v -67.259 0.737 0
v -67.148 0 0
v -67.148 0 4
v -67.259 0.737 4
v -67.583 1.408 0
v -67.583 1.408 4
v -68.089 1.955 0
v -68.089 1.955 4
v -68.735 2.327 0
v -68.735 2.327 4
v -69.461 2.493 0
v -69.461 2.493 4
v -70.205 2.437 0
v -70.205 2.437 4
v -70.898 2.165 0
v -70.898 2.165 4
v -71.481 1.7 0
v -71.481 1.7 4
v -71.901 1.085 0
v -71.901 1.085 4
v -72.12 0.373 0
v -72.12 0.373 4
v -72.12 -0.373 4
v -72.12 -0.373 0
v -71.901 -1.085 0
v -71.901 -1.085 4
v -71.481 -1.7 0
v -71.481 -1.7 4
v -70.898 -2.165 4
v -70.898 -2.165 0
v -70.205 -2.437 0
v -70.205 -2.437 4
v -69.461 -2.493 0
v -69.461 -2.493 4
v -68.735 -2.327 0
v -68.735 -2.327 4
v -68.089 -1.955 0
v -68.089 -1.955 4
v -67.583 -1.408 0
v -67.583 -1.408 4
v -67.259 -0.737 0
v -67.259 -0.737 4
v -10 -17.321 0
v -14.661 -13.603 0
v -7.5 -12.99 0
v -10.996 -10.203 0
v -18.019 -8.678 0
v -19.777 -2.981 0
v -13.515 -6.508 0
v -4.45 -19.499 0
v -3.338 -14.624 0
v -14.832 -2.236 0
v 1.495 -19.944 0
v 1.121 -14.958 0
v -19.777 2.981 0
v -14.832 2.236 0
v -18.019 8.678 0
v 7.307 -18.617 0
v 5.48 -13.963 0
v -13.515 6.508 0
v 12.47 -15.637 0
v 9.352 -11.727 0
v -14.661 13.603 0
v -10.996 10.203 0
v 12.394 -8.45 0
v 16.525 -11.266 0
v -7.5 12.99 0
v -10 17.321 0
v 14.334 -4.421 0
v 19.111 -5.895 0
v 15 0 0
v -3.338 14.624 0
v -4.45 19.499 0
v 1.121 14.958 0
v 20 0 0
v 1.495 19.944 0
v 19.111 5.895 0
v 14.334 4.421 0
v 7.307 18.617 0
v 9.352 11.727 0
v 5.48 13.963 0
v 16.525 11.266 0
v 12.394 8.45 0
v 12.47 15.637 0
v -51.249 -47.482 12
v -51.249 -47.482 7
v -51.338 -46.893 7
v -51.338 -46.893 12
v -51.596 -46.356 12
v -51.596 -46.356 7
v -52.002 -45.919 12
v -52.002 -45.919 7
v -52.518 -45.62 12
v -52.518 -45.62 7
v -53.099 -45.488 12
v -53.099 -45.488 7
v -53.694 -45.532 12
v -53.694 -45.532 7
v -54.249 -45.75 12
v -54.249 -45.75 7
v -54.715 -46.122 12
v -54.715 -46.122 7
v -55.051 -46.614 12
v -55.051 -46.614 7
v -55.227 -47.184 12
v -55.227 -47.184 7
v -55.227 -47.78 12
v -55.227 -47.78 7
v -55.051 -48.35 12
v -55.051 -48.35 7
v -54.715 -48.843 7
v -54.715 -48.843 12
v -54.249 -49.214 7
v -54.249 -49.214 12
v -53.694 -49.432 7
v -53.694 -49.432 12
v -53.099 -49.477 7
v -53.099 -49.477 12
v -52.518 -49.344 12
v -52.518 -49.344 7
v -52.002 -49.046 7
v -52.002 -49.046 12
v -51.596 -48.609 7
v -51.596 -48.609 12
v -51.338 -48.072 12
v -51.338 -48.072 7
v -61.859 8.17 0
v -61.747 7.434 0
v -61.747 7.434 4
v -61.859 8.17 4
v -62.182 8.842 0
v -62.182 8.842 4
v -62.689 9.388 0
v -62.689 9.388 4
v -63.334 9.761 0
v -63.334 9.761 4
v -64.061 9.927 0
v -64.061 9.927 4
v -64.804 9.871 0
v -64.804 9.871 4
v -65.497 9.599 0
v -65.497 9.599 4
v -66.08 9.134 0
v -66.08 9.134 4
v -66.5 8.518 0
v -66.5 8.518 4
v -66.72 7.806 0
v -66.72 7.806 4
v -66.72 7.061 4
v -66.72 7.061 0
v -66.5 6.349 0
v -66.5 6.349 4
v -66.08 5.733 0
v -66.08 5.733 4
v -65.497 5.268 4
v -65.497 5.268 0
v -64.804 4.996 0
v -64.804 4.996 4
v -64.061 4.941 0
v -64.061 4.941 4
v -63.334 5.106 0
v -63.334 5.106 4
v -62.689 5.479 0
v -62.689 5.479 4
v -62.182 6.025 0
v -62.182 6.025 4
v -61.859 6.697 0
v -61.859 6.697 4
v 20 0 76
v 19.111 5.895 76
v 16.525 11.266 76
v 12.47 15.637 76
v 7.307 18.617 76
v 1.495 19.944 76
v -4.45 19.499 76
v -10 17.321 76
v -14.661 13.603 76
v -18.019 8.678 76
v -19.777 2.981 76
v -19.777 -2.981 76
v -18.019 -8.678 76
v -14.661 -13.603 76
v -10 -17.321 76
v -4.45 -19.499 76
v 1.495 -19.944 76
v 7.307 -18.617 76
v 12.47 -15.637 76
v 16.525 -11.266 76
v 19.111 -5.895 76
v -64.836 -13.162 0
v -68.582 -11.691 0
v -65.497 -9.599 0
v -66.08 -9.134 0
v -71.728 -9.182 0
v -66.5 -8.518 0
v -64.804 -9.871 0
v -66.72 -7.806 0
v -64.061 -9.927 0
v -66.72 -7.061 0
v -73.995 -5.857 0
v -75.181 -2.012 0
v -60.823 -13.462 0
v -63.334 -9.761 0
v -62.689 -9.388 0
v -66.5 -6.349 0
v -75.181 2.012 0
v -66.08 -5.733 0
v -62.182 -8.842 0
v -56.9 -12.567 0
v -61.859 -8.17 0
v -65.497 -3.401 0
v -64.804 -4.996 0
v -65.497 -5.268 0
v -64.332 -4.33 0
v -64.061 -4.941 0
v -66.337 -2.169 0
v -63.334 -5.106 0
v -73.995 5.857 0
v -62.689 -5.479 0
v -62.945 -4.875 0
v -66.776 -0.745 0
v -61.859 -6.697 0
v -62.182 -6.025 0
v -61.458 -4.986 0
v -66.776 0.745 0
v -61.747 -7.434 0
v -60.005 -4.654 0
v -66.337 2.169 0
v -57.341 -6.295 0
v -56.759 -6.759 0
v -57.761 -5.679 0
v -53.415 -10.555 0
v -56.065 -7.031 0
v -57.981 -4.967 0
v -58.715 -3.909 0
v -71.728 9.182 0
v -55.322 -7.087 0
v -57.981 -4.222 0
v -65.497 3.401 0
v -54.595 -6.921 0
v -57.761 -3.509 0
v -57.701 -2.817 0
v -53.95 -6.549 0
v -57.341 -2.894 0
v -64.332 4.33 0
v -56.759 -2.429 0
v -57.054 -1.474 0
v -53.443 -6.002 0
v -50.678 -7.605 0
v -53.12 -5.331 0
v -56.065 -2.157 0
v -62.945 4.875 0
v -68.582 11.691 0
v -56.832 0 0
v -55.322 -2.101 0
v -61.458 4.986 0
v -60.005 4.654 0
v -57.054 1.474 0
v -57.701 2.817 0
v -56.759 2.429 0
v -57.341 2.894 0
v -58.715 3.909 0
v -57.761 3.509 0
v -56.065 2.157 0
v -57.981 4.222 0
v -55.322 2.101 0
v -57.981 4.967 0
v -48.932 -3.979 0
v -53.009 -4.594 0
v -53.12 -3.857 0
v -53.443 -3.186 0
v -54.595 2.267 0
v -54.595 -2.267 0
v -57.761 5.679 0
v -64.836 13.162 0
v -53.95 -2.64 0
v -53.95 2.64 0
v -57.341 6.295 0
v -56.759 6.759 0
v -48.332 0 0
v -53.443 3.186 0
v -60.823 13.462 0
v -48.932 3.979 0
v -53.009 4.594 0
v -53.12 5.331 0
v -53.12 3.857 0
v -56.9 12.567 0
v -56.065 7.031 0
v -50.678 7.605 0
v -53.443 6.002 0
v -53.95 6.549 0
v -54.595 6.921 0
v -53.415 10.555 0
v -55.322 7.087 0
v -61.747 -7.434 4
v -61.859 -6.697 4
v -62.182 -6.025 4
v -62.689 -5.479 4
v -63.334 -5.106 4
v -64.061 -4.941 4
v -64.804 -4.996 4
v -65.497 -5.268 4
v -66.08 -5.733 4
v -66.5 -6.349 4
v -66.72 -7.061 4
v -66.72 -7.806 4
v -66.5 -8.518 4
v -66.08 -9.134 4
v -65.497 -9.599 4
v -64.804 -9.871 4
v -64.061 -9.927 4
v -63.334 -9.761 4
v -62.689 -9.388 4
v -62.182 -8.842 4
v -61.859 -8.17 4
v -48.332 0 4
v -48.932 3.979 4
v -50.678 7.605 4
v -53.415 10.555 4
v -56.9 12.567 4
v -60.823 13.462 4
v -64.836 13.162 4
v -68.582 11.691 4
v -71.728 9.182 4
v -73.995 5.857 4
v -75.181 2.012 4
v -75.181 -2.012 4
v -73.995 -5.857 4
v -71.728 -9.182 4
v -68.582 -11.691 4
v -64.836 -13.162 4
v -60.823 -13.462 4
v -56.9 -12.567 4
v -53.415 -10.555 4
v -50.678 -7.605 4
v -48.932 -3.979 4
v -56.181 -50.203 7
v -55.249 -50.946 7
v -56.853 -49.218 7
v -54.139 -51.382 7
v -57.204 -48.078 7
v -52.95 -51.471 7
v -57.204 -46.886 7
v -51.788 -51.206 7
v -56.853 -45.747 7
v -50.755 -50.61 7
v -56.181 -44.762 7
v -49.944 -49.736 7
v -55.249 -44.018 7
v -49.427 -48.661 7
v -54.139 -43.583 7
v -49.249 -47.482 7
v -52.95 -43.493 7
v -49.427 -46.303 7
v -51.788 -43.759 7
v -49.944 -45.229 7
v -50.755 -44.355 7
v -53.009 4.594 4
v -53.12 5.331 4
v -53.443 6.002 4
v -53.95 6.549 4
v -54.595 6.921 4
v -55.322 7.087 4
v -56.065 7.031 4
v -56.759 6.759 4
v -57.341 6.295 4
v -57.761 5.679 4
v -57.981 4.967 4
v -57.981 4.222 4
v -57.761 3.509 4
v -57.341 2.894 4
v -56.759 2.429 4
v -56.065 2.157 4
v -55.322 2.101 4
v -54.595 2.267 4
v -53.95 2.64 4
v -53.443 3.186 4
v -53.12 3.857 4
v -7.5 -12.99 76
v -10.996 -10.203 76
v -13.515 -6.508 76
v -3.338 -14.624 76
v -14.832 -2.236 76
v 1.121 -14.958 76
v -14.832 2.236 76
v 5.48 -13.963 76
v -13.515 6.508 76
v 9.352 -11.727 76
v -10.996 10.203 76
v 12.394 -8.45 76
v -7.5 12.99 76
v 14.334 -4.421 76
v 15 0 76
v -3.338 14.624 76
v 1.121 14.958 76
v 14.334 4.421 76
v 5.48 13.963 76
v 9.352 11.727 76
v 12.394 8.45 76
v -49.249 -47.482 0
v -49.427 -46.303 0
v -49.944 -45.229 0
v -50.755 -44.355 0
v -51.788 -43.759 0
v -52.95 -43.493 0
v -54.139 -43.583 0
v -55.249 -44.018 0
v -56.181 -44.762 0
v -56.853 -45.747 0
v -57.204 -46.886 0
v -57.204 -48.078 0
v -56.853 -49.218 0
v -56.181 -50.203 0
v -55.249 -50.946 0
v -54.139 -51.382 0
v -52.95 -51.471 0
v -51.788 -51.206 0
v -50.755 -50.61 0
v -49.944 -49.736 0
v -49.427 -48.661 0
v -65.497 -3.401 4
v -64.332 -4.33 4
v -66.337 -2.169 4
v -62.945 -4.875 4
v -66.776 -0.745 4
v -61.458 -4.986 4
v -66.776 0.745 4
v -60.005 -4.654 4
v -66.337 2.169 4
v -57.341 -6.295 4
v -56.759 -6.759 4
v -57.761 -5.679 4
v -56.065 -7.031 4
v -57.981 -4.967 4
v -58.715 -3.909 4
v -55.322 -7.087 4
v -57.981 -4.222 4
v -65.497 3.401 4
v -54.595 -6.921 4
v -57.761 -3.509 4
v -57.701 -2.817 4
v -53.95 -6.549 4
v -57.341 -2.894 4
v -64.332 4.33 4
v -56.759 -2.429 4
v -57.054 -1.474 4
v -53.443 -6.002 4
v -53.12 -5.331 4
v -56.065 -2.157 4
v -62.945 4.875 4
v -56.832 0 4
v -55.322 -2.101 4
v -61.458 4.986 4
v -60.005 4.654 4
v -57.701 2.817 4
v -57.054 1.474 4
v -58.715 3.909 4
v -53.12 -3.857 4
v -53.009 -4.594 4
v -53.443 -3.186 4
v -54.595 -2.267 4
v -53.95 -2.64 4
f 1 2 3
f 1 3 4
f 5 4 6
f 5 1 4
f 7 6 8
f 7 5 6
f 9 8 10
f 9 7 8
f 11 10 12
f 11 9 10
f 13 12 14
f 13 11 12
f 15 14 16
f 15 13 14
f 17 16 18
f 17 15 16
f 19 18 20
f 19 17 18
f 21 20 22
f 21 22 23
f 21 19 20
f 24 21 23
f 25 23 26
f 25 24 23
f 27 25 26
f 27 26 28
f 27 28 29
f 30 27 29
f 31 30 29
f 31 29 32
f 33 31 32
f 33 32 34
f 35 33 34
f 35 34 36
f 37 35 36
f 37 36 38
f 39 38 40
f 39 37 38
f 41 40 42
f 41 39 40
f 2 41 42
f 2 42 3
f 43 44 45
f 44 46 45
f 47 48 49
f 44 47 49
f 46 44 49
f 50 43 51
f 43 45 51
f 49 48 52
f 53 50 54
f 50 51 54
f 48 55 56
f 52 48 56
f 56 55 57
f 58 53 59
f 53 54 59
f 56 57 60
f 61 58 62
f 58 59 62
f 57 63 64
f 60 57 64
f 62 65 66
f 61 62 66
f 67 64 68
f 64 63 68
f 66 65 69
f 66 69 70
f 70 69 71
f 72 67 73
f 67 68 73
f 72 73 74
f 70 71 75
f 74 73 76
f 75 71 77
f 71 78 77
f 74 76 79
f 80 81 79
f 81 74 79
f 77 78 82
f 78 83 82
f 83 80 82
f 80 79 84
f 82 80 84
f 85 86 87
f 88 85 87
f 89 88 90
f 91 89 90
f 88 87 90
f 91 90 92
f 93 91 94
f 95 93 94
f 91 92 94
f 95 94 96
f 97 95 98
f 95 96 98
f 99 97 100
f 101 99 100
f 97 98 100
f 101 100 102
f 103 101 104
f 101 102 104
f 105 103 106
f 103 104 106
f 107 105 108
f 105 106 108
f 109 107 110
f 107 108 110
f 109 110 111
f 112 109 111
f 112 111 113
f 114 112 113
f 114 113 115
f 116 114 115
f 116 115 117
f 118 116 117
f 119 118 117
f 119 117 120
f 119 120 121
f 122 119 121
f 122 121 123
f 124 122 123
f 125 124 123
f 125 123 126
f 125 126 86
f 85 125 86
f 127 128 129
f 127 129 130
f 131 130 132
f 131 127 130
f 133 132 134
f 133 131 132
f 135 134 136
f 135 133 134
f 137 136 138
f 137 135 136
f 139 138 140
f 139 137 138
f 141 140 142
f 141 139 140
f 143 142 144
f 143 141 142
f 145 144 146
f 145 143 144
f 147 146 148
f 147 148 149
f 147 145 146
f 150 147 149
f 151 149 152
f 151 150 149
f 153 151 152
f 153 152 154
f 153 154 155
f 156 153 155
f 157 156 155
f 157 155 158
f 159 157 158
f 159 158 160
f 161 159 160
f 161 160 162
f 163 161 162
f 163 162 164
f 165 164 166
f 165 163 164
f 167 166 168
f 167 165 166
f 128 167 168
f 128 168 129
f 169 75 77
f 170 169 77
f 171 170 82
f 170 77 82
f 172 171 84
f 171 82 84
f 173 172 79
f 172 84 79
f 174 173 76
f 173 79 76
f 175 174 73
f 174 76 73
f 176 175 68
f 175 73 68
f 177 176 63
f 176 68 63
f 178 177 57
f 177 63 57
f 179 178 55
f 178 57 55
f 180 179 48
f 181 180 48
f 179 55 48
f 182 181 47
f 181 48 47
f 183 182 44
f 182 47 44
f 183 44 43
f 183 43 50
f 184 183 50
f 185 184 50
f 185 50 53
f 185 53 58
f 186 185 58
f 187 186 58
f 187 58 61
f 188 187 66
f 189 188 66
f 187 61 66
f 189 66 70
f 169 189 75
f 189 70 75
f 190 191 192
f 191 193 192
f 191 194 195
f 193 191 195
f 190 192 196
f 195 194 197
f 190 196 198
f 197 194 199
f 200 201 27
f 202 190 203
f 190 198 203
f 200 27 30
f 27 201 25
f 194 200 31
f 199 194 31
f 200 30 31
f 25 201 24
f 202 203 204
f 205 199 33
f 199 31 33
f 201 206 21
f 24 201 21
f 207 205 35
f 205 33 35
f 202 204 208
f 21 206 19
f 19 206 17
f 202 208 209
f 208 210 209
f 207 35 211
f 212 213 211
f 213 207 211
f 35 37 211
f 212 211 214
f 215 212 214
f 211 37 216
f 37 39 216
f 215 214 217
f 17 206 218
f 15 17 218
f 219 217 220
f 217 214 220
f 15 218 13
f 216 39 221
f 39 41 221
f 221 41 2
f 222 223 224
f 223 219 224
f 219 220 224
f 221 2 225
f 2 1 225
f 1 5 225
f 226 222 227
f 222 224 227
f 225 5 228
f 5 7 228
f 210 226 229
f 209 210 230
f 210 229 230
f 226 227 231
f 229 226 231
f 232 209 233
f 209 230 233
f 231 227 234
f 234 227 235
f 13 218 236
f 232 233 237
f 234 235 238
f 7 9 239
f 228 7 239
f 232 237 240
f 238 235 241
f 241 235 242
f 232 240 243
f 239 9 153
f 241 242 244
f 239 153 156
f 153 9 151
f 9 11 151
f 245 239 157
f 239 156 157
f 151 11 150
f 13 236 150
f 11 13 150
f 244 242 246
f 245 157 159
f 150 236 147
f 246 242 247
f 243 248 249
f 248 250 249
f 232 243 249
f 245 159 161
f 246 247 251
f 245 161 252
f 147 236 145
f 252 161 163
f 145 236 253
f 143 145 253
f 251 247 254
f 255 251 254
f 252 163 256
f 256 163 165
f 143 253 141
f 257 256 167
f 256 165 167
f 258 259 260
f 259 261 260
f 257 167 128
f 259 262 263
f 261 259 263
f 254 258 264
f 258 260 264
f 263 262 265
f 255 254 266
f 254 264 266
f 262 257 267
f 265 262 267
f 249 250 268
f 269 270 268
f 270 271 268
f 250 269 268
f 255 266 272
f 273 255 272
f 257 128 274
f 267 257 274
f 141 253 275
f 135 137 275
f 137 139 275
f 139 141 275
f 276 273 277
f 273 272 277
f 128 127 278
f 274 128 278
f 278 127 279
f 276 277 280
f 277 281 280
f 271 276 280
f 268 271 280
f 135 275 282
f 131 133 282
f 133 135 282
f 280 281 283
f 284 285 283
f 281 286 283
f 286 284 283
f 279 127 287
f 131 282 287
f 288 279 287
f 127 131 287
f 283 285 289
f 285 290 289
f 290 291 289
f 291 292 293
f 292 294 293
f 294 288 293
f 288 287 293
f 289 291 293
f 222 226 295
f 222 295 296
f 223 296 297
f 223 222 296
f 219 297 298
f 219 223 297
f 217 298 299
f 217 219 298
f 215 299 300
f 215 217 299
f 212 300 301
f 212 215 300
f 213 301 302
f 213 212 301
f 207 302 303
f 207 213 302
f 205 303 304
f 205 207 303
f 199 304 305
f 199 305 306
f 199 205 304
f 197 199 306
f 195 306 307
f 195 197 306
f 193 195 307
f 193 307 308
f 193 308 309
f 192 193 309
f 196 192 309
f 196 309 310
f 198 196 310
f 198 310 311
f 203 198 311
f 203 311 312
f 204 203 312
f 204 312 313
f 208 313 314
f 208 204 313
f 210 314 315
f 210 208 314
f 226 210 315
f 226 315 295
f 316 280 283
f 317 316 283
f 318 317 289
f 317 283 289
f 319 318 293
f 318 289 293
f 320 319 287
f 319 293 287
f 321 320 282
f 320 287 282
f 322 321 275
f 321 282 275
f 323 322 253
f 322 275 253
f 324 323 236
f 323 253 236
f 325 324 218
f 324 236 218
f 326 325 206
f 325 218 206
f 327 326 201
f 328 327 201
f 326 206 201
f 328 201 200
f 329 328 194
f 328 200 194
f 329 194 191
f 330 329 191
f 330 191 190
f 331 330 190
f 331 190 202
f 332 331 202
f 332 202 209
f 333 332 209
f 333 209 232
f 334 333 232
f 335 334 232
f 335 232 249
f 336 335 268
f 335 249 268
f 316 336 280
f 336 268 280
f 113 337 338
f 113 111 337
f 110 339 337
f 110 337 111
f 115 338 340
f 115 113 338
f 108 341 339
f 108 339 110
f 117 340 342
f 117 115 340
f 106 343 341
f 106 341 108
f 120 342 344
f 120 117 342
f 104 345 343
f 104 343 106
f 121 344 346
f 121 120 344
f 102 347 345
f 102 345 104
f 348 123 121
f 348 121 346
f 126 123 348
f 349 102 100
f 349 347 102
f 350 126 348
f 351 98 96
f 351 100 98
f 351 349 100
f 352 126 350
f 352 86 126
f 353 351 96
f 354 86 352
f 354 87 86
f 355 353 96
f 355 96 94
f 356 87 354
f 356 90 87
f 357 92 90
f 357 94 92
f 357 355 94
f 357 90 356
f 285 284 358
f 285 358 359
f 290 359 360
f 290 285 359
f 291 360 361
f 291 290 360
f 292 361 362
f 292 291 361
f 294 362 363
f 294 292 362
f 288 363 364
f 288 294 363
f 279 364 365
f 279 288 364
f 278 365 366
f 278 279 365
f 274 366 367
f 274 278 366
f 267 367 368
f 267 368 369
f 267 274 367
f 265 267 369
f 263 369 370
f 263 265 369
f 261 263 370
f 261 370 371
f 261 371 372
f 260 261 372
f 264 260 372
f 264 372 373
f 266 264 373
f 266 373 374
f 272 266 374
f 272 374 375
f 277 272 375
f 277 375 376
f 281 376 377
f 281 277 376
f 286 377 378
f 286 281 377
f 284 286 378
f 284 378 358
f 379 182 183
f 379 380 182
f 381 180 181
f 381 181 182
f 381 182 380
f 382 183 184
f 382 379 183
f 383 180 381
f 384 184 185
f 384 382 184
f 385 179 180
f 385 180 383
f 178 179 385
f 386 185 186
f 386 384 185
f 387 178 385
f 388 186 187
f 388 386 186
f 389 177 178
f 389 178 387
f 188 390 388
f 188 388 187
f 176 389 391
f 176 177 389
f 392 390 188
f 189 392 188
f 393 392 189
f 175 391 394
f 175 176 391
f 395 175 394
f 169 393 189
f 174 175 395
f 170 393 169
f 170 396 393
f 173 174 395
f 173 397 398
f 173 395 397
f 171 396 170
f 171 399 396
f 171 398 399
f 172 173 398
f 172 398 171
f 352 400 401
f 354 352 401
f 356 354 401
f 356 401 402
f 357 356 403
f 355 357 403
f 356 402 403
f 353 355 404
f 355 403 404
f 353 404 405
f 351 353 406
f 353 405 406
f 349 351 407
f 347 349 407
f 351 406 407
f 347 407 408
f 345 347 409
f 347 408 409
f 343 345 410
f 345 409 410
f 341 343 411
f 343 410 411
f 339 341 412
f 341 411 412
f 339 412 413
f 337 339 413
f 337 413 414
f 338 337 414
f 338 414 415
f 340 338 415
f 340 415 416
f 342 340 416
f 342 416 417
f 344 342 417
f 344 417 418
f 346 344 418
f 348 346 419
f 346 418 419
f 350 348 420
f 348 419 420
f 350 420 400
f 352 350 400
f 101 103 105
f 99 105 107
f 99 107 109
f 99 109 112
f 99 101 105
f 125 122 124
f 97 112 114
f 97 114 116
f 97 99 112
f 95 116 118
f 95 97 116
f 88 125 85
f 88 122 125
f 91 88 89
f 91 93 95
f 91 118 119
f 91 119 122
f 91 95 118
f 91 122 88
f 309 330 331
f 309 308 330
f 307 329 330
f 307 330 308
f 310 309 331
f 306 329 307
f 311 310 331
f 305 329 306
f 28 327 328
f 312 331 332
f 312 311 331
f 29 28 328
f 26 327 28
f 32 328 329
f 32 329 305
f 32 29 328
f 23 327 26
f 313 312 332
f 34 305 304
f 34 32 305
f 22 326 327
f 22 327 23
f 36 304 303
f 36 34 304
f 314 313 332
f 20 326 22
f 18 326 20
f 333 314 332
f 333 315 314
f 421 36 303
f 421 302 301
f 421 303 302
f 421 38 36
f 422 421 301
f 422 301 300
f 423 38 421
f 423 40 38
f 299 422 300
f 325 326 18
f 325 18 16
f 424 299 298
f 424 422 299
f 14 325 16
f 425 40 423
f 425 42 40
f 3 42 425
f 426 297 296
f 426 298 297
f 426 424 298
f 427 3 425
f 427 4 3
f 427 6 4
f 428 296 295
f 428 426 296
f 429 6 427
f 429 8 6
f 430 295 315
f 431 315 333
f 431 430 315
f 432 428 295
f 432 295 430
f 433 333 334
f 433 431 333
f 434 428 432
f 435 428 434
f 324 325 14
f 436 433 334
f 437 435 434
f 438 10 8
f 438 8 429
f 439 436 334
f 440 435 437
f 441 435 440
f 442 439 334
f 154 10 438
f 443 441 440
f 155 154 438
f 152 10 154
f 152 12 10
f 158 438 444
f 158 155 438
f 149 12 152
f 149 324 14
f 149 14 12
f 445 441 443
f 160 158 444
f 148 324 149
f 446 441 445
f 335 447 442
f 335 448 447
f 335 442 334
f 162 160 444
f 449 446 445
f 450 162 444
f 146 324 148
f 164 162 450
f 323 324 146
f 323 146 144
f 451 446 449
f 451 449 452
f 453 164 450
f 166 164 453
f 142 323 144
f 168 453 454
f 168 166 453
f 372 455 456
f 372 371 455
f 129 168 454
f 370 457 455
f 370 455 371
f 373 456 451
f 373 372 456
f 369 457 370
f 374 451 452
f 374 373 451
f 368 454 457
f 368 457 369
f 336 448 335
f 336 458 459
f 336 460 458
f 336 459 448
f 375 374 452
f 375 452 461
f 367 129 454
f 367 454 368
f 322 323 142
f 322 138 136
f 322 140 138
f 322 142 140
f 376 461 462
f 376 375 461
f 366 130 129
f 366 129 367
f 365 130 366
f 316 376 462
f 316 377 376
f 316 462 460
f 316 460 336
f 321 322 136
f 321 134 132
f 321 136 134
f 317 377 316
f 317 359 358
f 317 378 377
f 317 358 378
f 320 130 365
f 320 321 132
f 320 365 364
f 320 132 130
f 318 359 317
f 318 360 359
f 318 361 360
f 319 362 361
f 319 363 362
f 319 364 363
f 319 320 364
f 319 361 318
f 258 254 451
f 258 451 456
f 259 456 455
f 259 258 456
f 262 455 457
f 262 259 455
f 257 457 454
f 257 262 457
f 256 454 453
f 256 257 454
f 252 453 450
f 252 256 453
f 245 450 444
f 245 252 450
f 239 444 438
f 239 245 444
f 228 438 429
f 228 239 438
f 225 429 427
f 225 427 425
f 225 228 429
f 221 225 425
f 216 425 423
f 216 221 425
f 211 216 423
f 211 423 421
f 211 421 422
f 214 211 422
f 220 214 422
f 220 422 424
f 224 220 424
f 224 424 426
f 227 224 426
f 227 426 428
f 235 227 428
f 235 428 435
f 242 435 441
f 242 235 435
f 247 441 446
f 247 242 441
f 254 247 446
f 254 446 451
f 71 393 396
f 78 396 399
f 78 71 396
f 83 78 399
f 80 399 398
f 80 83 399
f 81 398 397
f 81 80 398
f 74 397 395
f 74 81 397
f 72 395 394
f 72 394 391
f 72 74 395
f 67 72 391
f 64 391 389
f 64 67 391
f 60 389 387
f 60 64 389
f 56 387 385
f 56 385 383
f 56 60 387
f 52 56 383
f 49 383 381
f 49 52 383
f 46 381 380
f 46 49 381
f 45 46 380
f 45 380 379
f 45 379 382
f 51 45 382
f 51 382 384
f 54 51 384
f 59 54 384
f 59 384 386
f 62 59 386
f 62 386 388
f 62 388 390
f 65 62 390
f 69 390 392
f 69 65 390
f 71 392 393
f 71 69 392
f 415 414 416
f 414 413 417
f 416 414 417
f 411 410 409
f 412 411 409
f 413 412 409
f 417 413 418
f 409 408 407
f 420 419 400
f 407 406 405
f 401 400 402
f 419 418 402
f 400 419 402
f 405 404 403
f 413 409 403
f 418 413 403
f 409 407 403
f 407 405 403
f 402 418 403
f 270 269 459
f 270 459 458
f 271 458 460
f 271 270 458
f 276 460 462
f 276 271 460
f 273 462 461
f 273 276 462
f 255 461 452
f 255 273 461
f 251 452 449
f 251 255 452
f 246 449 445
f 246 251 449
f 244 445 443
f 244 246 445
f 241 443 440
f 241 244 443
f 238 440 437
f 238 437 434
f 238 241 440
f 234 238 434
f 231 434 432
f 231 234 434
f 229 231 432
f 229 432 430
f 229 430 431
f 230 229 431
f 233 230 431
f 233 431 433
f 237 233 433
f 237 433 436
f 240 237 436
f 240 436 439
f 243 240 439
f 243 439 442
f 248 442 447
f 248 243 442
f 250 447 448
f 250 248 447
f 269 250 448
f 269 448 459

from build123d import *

# Parameters (mm, degrees)
F0_R     = 20
F0_R_2   = 15
F1_DEPTH = 76
F0_R_3   = 13.5
F0_R_4   = 10.5
F0_R_5   = 2.5
F0_R_6   = 5
F2_DEPTH = 4
F0_R_7   = 2
F3_DEPTH = 12
F0_R_8   = 4
F4_DEPTH = 7


with BuildPart() as f1:
    # F0 (on Top) → F1 (new body)
    with BuildSketch(Plane.XY):
        Circle(F0_R)
        Circle(F0_R_2, mode=Mode.SUBTRACT)
    extrude(amount=F1_DEPTH)


with BuildPart() as f2:
    # F0 (on Top) → F2 (new body)
    with BuildSketch(Plane.XY):
        with Locations((-61.8321336806, 0)):
            Circle(F0_R_3)
        with Locations((-61.8321336806, 0)):
            Circle(F0_R_4, mode=Mode.SUBTRACT)
        with Locations((-61.8321336806, 0)):
            Circle(F0_R_4)
        with Locations((-64.2474329288, -7.4335267337)):
            Circle(F0_R_5, mode=Mode.SUBTRACT)
        with Locations((-55.5087981556, -4.5941721777)):
            Circle(F0_R_5, mode=Mode.SUBTRACT)
        with Locations((-69.648206234, 0)):
            Circle(F0_R_5, mode=Mode.SUBTRACT)
        with Locations((-61.8321336806, 0)):
            Circle(F0_R_6, mode=Mode.SUBTRACT)
        with Locations((-64.2474329288, 7.4335267337)):
            Circle(F0_R_5, mode=Mode.SUBTRACT)
        with Locations((-55.5087981556, 4.5941721777)):
            Circle(F0_R_5, mode=Mode.SUBTRACT)
    extrude(amount=F2_DEPTH)


with BuildPart() as f3:
    # F0 (on Top) → F3 (new body)
    with BuildSketch(Plane.XY):
        with Locations((-53.2489009202, -47.4822334945)):
            Circle(F0_R_7)
    extrude(amount=F3_DEPTH)

    # F0 (on Top) → F4 (join)
    with BuildSketch(Plane.XY):
        with Locations((-53.2489009202, -47.4822334945)):
            Circle(F0_R_8)
        with Locations((-53.2489009202, -47.4822334945)):
            Circle(F0_R_7, mode=Mode.SUBTRACT)
    extrude(amount=F4_DEPTH)


solid = Compound([f1.part, f2.part, f3.part])
